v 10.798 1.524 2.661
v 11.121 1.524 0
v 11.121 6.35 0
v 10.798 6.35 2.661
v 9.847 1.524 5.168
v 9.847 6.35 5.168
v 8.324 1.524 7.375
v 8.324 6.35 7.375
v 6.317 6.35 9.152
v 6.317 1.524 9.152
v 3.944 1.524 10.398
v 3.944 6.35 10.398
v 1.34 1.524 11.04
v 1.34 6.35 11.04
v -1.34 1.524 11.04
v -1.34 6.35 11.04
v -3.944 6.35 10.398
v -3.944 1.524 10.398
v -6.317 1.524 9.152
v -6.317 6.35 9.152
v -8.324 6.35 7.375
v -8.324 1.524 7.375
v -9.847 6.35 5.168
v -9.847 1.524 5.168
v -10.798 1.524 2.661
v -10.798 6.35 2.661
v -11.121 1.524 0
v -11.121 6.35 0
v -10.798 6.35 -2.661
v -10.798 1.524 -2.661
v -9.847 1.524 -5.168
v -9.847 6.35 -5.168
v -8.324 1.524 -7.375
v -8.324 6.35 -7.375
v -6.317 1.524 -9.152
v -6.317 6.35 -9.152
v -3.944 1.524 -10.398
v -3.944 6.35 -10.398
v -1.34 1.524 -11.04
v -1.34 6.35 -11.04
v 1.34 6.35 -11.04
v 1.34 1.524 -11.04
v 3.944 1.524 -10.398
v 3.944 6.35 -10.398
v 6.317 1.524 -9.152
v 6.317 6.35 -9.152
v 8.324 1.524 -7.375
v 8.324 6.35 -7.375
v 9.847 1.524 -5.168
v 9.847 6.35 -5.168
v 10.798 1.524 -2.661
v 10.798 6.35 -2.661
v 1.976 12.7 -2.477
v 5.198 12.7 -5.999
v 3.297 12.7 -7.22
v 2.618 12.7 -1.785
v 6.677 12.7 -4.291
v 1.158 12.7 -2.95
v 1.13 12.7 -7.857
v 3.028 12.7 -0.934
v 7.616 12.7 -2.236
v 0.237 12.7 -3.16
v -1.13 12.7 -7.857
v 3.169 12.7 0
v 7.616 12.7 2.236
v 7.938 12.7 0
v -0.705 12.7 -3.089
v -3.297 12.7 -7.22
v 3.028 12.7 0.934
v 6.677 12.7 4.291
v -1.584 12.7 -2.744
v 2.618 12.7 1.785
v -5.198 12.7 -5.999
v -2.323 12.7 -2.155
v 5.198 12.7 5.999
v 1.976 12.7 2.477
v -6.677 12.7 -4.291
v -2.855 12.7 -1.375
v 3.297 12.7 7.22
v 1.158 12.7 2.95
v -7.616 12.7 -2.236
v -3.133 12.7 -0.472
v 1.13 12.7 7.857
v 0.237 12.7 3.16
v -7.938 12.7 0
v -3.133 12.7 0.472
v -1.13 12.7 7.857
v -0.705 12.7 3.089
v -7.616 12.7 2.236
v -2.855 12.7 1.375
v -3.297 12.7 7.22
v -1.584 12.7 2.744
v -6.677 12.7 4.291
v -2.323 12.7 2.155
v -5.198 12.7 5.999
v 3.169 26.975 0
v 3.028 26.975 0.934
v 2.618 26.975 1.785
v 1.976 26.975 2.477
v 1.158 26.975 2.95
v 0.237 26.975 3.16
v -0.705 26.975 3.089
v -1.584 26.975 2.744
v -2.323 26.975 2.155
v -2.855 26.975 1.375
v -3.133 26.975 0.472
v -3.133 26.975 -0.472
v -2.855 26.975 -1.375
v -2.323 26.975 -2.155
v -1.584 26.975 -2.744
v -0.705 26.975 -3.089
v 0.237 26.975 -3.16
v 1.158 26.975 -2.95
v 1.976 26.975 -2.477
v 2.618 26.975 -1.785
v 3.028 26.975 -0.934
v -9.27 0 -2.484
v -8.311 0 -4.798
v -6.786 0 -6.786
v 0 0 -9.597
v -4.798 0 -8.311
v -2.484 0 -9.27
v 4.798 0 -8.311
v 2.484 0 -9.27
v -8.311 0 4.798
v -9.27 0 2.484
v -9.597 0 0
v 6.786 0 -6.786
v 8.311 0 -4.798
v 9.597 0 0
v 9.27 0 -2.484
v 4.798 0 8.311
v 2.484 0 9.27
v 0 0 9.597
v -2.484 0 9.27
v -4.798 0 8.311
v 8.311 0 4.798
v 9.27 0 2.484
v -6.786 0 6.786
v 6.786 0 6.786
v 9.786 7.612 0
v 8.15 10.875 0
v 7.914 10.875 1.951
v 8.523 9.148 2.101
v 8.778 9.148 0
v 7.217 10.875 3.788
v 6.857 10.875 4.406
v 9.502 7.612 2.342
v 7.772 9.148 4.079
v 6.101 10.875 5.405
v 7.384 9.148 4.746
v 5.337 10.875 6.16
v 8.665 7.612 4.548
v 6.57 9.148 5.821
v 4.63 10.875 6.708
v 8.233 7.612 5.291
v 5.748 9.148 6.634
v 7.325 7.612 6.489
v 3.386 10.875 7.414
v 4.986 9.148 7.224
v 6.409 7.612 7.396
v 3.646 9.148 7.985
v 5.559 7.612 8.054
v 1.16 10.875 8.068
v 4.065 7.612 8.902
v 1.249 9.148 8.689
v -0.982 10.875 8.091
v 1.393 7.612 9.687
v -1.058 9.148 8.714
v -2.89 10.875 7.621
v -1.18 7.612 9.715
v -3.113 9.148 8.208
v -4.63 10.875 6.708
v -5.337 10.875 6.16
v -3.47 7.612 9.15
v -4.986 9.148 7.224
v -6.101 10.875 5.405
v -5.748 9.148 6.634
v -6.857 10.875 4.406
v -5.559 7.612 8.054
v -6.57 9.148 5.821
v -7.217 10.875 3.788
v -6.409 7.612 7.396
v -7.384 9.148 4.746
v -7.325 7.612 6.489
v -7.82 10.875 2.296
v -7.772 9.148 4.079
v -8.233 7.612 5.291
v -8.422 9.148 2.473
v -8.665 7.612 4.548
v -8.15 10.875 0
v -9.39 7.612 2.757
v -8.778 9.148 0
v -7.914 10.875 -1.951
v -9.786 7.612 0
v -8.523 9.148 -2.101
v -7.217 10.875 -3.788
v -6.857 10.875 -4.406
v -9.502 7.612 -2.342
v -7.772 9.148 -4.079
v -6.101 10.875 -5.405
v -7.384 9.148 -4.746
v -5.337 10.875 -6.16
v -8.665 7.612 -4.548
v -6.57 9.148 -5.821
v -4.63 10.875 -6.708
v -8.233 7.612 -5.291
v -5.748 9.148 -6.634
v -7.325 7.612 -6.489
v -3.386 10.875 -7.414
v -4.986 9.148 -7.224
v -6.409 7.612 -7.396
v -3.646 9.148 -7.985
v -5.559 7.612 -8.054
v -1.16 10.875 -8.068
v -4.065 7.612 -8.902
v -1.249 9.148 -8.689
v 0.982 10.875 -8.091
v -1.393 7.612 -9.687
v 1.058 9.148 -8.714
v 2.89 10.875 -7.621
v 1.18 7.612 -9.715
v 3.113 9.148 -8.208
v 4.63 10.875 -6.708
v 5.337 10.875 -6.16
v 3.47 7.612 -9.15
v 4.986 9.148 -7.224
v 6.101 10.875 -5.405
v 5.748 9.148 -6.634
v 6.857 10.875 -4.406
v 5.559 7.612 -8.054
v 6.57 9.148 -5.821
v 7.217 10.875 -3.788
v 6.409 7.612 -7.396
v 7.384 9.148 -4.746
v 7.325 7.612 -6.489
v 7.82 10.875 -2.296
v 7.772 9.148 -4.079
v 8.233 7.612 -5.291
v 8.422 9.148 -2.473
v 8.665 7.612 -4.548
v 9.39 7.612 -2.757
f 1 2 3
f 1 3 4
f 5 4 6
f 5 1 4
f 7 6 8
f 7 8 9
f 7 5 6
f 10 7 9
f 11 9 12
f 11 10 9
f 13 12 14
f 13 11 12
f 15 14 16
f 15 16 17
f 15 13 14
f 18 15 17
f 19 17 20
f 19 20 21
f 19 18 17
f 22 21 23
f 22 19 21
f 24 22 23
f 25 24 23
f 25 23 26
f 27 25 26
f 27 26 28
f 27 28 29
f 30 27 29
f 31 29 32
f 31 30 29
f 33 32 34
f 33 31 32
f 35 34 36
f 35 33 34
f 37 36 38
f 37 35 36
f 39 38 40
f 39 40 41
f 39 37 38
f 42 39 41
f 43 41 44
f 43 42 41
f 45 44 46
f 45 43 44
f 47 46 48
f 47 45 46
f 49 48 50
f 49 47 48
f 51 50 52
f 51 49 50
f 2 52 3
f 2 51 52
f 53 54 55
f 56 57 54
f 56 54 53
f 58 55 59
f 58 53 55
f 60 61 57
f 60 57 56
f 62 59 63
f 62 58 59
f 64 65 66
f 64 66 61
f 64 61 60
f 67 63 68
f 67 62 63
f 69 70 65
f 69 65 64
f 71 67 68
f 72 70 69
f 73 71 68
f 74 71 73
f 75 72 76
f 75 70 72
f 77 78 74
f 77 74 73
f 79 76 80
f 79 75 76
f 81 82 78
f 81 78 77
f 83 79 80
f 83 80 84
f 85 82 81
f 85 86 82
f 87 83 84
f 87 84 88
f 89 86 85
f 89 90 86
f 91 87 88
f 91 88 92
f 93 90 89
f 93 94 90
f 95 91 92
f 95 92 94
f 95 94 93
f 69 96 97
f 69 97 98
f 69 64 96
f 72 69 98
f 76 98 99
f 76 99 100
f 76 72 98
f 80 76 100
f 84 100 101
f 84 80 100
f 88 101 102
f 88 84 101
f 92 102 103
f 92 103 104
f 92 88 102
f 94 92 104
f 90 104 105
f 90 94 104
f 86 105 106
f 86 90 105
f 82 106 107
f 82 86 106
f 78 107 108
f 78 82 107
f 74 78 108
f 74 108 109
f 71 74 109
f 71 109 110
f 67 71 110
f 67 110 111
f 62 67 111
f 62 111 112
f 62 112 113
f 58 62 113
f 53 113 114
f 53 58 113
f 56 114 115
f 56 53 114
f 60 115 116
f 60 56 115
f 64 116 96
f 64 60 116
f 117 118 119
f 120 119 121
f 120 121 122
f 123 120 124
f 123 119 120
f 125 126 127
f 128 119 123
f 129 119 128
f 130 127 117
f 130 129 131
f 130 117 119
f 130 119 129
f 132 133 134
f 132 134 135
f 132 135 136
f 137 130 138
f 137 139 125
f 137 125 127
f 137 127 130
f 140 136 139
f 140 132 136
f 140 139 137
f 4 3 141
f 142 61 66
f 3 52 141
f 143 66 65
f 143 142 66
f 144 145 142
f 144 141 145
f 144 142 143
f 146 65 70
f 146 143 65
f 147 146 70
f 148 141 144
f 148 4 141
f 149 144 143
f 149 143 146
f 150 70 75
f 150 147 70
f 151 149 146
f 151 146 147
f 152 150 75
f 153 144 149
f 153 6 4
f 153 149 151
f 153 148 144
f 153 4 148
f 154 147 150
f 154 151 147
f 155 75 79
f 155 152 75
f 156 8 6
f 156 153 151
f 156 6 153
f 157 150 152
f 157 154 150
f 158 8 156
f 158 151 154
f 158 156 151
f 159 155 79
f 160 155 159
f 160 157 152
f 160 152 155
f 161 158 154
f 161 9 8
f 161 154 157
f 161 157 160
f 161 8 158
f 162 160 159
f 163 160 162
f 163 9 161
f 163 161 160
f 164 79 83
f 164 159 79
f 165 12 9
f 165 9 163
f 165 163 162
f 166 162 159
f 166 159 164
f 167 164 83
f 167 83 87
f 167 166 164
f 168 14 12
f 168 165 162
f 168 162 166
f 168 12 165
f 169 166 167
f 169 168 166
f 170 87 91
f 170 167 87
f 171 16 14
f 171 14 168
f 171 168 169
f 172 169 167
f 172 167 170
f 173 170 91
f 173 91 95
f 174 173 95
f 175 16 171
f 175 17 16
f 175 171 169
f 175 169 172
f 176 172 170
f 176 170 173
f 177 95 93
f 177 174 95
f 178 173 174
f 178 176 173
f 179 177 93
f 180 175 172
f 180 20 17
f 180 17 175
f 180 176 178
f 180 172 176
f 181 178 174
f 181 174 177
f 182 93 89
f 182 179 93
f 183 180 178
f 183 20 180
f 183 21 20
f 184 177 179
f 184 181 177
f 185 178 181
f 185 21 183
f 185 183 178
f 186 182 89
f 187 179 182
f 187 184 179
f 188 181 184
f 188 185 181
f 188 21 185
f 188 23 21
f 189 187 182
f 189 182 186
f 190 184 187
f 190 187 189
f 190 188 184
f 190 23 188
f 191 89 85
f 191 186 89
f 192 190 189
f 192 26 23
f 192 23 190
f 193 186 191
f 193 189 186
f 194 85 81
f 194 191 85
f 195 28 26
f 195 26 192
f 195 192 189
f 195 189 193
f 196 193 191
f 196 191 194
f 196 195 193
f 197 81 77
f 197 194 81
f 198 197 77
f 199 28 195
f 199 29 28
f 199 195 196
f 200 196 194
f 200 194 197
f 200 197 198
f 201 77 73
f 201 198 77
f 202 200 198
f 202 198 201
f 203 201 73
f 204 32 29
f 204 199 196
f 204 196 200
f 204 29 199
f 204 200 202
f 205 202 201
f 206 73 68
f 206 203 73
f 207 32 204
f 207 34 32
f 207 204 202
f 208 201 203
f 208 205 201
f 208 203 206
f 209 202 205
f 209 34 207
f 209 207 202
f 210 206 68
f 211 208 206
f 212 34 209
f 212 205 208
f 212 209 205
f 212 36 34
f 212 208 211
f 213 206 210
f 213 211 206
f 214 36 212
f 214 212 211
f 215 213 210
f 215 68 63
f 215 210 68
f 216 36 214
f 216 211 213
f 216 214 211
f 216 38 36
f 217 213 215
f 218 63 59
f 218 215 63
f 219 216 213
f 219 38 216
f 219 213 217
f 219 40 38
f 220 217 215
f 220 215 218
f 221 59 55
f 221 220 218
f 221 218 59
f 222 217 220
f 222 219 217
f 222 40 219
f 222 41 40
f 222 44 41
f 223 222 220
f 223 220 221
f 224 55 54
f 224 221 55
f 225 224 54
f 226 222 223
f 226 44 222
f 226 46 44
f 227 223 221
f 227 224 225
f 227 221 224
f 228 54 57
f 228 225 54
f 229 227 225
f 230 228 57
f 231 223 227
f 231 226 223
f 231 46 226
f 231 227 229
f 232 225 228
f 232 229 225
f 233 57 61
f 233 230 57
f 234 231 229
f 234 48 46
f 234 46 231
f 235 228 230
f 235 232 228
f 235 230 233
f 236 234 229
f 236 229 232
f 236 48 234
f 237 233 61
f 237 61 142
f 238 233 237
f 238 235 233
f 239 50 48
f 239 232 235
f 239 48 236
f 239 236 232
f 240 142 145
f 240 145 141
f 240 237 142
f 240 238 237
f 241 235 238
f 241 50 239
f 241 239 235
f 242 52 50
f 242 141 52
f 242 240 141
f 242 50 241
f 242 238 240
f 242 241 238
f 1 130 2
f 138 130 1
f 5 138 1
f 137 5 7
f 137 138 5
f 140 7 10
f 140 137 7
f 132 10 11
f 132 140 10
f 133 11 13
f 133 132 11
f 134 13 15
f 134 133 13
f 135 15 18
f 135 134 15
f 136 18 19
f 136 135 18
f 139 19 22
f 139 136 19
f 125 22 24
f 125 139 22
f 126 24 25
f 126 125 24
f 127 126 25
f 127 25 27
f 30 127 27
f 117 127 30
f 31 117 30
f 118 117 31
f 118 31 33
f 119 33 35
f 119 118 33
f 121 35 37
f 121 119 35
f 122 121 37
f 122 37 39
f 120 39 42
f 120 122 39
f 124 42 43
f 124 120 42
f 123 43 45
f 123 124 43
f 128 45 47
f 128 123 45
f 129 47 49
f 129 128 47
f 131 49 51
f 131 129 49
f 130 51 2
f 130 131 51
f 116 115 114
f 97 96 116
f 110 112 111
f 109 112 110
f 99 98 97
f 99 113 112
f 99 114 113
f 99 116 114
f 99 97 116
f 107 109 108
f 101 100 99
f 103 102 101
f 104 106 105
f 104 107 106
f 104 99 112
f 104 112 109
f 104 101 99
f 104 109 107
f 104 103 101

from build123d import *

# Parameters (mm, degrees)
CHAMFER1_SIZE = 1.524


with BuildPart() as part:
    # Sketch1 → Revolve1 (revolve)
    with BuildSketch(Plane.XY):
        with BuildLine():
            Line((0, 0), (0, 26.9748))
            Line((0, 26.9748), (3.16865, 26.9748))
            Line((3.16865, 26.9748), (3.16865, 12.7))
            Line((3.16865, 12.7), (7.9375, 12.7))
            ThreePointArc((7.9375, 12.7), (8.777939273, 9.148340087), (11.120996905, 6.35))
            Line((11.120996905, 6.35), (11.120996905, 0))
            Line((11.120996905, 0), (0, 0))
        make_face()
    revolve(axis=Axis((0, 0, 0), (0, -1, 0)))

    # Chamfer1
    chamfer1_edges = [part.edges().sort_by_distance(p)[0] for p in [
        (-11.120996905, 0, 0),
    ]]
    chamfer(chamfer1_edges, length=CHAMFER1_SIZE)


solid = part.part
